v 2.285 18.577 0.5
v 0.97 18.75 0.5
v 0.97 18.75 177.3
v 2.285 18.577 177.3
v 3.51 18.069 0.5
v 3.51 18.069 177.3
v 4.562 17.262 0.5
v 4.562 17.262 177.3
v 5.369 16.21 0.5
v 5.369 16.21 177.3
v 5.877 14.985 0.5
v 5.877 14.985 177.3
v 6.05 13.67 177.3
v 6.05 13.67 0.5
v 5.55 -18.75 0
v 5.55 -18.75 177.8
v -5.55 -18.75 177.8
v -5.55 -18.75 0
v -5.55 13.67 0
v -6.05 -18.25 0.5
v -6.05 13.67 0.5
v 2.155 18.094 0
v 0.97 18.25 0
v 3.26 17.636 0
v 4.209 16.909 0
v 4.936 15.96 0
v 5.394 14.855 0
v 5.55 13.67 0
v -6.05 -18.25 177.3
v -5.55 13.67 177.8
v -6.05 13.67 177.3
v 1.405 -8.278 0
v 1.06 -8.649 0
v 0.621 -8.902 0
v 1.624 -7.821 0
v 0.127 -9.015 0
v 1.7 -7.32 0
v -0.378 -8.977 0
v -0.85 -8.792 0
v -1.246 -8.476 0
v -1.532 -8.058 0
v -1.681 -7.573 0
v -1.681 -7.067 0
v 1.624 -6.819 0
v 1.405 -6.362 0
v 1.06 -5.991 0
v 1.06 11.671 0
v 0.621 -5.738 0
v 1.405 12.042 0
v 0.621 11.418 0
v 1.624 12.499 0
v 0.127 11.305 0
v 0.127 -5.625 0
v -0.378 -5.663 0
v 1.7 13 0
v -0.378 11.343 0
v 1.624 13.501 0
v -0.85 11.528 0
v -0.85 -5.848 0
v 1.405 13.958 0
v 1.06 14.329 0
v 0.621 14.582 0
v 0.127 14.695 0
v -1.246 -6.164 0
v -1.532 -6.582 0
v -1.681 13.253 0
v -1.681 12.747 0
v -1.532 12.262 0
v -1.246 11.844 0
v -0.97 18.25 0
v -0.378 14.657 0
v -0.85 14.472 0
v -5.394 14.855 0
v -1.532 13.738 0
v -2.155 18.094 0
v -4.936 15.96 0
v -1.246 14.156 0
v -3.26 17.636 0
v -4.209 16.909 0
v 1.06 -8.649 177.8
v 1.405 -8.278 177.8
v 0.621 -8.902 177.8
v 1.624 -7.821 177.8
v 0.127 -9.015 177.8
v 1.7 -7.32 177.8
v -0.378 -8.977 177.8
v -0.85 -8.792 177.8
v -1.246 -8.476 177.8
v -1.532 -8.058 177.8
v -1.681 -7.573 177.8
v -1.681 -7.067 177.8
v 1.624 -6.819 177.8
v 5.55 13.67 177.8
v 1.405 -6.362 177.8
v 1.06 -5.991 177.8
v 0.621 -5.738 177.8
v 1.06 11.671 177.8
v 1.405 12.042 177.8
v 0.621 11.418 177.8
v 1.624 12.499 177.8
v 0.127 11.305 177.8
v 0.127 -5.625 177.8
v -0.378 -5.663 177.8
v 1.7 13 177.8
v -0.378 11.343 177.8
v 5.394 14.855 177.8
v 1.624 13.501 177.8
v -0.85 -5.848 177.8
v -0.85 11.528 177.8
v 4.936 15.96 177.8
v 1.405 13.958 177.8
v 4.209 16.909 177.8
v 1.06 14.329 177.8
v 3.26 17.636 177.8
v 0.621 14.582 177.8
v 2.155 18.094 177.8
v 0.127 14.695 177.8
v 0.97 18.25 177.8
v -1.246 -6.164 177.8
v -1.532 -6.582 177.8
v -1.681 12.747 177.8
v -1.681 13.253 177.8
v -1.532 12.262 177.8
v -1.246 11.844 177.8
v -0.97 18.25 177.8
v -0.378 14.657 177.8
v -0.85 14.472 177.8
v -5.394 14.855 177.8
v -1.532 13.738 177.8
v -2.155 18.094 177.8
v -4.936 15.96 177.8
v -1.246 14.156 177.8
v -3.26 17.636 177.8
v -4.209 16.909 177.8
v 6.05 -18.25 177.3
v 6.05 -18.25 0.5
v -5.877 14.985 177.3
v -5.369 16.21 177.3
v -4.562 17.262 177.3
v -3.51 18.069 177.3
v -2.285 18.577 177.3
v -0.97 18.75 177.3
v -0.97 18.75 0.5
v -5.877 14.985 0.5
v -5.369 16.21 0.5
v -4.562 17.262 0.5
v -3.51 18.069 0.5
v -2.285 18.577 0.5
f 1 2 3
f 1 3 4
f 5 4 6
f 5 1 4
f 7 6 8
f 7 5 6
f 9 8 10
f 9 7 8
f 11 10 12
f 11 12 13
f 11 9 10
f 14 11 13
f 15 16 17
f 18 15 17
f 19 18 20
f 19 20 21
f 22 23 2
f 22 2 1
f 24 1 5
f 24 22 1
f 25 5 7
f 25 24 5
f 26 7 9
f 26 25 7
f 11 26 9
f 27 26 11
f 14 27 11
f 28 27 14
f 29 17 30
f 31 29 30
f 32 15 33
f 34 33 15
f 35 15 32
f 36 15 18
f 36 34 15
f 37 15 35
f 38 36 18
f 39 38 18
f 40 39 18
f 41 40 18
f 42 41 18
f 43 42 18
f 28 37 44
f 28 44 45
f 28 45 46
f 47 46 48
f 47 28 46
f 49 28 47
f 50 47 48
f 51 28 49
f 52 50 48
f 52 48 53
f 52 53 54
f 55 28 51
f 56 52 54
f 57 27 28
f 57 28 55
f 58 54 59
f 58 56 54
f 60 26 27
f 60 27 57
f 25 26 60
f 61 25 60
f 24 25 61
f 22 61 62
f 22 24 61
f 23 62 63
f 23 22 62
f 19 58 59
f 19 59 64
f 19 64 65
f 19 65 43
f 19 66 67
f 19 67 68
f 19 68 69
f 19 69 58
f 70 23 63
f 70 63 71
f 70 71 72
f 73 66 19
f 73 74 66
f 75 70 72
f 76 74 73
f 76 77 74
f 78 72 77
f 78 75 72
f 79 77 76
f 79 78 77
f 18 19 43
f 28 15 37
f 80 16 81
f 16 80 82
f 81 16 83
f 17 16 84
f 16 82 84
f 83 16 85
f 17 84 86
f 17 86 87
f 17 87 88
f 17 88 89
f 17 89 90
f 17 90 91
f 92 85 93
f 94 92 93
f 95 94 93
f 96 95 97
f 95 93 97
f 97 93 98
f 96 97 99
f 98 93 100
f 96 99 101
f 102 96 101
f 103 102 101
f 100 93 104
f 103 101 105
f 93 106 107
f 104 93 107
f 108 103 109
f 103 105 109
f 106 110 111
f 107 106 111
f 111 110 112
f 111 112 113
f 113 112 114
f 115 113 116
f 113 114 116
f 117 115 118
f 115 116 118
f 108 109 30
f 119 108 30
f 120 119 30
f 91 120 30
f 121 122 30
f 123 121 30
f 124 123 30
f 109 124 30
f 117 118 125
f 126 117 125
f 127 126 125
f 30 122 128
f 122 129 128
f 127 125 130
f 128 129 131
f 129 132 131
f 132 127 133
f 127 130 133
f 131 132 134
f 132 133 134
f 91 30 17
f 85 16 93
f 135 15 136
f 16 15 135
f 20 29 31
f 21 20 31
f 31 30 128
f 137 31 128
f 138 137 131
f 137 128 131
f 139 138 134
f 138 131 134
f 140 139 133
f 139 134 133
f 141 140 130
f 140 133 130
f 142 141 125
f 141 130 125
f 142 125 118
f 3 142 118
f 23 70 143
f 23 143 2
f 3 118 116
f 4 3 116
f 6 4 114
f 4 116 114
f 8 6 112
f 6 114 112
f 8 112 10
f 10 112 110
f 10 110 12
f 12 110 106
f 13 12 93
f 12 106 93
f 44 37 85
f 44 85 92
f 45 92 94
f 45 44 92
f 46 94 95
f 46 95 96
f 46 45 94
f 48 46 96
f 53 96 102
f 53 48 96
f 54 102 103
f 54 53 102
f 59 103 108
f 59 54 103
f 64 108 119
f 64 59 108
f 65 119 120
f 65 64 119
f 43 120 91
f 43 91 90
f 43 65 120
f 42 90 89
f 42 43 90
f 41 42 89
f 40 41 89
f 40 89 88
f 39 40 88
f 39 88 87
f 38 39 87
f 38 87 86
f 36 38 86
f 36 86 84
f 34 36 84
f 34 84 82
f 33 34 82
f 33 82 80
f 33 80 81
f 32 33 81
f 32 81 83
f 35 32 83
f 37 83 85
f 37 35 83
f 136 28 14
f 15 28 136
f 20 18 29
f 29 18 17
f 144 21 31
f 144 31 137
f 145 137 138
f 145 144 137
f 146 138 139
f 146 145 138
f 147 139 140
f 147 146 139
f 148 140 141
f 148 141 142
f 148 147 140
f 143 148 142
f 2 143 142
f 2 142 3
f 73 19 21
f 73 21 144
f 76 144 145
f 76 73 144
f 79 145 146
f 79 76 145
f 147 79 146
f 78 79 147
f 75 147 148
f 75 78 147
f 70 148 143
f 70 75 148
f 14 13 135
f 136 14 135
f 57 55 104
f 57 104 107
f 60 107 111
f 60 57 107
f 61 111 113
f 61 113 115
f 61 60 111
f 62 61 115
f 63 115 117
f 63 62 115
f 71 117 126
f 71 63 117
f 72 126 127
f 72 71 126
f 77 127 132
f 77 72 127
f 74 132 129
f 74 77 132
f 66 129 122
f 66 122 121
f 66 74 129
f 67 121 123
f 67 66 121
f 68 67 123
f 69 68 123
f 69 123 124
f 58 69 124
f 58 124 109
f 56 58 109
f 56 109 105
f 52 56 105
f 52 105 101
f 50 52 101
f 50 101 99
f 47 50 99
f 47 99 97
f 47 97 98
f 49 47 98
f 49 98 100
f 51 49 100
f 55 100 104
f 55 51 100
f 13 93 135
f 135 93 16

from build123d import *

# Parameters (mm, degrees)
SKETCH1_R           = 1.7
BOSS_EXTRUDE1_DEPTH = 177.8
CHAMFER1_SIZE       = 0.5


with BuildPart() as part:
    # Sketch1 → Boss-Extrude1 (new body)
    with BuildSketch(Plane.XY):
        with BuildLine():
            Line((-0.97, 18.75), (0.97, 18.75))
            ThreePointArc((0.97, 18.75), (4.562102448, 17.262102448), (6.05, 13.67))
            Line((6.05, 13.67), (6.05, -18.75))
            Line((6.05, -18.75), (-6.05, -18.75))
            Line((-6.05, -18.75), (-6.05, 13.67))
            ThreePointArc((-6.05, 13.67), (-4.562102448, 17.262102448), (-0.97, 18.75))
        make_face()
        with Locations((0, 13)):
            Circle(SKETCH1_R, mode=Mode.SUBTRACT)
        with Locations((0, -7.32)):
            Circle(SKETCH1_R, mode=Mode.SUBTRACT)
    extrude(amount=BOSS_EXTRUDE1_DEPTH)

    # Chamfer1
    chamfer1_edges = [part.edges().sort_by_distance(p)[0] for p in [
        (6.05, -18.75, 88.9),
        (-6.05, -18.75, 88.9),
        (0, 18.75, 177.8),
        (-4.562102448, 17.262102448, 177.8),
        (-6.05, -2.54, 177.8),
        (6.05, -2.54, 177.8),
        (-6.05, -2.54, 0),
        (-4.562102448, 17.262102448, 0),
        (0, 18.75, 0),
        (4.562102448, 17.262102448, 0),
        (6.05, -2.54, 0),
        (4.562102448, 17.262102448, 177.8),
    ]]
    chamfer(chamfer1_edges, length=CHAMFER1_SIZE)


solid = part.part
